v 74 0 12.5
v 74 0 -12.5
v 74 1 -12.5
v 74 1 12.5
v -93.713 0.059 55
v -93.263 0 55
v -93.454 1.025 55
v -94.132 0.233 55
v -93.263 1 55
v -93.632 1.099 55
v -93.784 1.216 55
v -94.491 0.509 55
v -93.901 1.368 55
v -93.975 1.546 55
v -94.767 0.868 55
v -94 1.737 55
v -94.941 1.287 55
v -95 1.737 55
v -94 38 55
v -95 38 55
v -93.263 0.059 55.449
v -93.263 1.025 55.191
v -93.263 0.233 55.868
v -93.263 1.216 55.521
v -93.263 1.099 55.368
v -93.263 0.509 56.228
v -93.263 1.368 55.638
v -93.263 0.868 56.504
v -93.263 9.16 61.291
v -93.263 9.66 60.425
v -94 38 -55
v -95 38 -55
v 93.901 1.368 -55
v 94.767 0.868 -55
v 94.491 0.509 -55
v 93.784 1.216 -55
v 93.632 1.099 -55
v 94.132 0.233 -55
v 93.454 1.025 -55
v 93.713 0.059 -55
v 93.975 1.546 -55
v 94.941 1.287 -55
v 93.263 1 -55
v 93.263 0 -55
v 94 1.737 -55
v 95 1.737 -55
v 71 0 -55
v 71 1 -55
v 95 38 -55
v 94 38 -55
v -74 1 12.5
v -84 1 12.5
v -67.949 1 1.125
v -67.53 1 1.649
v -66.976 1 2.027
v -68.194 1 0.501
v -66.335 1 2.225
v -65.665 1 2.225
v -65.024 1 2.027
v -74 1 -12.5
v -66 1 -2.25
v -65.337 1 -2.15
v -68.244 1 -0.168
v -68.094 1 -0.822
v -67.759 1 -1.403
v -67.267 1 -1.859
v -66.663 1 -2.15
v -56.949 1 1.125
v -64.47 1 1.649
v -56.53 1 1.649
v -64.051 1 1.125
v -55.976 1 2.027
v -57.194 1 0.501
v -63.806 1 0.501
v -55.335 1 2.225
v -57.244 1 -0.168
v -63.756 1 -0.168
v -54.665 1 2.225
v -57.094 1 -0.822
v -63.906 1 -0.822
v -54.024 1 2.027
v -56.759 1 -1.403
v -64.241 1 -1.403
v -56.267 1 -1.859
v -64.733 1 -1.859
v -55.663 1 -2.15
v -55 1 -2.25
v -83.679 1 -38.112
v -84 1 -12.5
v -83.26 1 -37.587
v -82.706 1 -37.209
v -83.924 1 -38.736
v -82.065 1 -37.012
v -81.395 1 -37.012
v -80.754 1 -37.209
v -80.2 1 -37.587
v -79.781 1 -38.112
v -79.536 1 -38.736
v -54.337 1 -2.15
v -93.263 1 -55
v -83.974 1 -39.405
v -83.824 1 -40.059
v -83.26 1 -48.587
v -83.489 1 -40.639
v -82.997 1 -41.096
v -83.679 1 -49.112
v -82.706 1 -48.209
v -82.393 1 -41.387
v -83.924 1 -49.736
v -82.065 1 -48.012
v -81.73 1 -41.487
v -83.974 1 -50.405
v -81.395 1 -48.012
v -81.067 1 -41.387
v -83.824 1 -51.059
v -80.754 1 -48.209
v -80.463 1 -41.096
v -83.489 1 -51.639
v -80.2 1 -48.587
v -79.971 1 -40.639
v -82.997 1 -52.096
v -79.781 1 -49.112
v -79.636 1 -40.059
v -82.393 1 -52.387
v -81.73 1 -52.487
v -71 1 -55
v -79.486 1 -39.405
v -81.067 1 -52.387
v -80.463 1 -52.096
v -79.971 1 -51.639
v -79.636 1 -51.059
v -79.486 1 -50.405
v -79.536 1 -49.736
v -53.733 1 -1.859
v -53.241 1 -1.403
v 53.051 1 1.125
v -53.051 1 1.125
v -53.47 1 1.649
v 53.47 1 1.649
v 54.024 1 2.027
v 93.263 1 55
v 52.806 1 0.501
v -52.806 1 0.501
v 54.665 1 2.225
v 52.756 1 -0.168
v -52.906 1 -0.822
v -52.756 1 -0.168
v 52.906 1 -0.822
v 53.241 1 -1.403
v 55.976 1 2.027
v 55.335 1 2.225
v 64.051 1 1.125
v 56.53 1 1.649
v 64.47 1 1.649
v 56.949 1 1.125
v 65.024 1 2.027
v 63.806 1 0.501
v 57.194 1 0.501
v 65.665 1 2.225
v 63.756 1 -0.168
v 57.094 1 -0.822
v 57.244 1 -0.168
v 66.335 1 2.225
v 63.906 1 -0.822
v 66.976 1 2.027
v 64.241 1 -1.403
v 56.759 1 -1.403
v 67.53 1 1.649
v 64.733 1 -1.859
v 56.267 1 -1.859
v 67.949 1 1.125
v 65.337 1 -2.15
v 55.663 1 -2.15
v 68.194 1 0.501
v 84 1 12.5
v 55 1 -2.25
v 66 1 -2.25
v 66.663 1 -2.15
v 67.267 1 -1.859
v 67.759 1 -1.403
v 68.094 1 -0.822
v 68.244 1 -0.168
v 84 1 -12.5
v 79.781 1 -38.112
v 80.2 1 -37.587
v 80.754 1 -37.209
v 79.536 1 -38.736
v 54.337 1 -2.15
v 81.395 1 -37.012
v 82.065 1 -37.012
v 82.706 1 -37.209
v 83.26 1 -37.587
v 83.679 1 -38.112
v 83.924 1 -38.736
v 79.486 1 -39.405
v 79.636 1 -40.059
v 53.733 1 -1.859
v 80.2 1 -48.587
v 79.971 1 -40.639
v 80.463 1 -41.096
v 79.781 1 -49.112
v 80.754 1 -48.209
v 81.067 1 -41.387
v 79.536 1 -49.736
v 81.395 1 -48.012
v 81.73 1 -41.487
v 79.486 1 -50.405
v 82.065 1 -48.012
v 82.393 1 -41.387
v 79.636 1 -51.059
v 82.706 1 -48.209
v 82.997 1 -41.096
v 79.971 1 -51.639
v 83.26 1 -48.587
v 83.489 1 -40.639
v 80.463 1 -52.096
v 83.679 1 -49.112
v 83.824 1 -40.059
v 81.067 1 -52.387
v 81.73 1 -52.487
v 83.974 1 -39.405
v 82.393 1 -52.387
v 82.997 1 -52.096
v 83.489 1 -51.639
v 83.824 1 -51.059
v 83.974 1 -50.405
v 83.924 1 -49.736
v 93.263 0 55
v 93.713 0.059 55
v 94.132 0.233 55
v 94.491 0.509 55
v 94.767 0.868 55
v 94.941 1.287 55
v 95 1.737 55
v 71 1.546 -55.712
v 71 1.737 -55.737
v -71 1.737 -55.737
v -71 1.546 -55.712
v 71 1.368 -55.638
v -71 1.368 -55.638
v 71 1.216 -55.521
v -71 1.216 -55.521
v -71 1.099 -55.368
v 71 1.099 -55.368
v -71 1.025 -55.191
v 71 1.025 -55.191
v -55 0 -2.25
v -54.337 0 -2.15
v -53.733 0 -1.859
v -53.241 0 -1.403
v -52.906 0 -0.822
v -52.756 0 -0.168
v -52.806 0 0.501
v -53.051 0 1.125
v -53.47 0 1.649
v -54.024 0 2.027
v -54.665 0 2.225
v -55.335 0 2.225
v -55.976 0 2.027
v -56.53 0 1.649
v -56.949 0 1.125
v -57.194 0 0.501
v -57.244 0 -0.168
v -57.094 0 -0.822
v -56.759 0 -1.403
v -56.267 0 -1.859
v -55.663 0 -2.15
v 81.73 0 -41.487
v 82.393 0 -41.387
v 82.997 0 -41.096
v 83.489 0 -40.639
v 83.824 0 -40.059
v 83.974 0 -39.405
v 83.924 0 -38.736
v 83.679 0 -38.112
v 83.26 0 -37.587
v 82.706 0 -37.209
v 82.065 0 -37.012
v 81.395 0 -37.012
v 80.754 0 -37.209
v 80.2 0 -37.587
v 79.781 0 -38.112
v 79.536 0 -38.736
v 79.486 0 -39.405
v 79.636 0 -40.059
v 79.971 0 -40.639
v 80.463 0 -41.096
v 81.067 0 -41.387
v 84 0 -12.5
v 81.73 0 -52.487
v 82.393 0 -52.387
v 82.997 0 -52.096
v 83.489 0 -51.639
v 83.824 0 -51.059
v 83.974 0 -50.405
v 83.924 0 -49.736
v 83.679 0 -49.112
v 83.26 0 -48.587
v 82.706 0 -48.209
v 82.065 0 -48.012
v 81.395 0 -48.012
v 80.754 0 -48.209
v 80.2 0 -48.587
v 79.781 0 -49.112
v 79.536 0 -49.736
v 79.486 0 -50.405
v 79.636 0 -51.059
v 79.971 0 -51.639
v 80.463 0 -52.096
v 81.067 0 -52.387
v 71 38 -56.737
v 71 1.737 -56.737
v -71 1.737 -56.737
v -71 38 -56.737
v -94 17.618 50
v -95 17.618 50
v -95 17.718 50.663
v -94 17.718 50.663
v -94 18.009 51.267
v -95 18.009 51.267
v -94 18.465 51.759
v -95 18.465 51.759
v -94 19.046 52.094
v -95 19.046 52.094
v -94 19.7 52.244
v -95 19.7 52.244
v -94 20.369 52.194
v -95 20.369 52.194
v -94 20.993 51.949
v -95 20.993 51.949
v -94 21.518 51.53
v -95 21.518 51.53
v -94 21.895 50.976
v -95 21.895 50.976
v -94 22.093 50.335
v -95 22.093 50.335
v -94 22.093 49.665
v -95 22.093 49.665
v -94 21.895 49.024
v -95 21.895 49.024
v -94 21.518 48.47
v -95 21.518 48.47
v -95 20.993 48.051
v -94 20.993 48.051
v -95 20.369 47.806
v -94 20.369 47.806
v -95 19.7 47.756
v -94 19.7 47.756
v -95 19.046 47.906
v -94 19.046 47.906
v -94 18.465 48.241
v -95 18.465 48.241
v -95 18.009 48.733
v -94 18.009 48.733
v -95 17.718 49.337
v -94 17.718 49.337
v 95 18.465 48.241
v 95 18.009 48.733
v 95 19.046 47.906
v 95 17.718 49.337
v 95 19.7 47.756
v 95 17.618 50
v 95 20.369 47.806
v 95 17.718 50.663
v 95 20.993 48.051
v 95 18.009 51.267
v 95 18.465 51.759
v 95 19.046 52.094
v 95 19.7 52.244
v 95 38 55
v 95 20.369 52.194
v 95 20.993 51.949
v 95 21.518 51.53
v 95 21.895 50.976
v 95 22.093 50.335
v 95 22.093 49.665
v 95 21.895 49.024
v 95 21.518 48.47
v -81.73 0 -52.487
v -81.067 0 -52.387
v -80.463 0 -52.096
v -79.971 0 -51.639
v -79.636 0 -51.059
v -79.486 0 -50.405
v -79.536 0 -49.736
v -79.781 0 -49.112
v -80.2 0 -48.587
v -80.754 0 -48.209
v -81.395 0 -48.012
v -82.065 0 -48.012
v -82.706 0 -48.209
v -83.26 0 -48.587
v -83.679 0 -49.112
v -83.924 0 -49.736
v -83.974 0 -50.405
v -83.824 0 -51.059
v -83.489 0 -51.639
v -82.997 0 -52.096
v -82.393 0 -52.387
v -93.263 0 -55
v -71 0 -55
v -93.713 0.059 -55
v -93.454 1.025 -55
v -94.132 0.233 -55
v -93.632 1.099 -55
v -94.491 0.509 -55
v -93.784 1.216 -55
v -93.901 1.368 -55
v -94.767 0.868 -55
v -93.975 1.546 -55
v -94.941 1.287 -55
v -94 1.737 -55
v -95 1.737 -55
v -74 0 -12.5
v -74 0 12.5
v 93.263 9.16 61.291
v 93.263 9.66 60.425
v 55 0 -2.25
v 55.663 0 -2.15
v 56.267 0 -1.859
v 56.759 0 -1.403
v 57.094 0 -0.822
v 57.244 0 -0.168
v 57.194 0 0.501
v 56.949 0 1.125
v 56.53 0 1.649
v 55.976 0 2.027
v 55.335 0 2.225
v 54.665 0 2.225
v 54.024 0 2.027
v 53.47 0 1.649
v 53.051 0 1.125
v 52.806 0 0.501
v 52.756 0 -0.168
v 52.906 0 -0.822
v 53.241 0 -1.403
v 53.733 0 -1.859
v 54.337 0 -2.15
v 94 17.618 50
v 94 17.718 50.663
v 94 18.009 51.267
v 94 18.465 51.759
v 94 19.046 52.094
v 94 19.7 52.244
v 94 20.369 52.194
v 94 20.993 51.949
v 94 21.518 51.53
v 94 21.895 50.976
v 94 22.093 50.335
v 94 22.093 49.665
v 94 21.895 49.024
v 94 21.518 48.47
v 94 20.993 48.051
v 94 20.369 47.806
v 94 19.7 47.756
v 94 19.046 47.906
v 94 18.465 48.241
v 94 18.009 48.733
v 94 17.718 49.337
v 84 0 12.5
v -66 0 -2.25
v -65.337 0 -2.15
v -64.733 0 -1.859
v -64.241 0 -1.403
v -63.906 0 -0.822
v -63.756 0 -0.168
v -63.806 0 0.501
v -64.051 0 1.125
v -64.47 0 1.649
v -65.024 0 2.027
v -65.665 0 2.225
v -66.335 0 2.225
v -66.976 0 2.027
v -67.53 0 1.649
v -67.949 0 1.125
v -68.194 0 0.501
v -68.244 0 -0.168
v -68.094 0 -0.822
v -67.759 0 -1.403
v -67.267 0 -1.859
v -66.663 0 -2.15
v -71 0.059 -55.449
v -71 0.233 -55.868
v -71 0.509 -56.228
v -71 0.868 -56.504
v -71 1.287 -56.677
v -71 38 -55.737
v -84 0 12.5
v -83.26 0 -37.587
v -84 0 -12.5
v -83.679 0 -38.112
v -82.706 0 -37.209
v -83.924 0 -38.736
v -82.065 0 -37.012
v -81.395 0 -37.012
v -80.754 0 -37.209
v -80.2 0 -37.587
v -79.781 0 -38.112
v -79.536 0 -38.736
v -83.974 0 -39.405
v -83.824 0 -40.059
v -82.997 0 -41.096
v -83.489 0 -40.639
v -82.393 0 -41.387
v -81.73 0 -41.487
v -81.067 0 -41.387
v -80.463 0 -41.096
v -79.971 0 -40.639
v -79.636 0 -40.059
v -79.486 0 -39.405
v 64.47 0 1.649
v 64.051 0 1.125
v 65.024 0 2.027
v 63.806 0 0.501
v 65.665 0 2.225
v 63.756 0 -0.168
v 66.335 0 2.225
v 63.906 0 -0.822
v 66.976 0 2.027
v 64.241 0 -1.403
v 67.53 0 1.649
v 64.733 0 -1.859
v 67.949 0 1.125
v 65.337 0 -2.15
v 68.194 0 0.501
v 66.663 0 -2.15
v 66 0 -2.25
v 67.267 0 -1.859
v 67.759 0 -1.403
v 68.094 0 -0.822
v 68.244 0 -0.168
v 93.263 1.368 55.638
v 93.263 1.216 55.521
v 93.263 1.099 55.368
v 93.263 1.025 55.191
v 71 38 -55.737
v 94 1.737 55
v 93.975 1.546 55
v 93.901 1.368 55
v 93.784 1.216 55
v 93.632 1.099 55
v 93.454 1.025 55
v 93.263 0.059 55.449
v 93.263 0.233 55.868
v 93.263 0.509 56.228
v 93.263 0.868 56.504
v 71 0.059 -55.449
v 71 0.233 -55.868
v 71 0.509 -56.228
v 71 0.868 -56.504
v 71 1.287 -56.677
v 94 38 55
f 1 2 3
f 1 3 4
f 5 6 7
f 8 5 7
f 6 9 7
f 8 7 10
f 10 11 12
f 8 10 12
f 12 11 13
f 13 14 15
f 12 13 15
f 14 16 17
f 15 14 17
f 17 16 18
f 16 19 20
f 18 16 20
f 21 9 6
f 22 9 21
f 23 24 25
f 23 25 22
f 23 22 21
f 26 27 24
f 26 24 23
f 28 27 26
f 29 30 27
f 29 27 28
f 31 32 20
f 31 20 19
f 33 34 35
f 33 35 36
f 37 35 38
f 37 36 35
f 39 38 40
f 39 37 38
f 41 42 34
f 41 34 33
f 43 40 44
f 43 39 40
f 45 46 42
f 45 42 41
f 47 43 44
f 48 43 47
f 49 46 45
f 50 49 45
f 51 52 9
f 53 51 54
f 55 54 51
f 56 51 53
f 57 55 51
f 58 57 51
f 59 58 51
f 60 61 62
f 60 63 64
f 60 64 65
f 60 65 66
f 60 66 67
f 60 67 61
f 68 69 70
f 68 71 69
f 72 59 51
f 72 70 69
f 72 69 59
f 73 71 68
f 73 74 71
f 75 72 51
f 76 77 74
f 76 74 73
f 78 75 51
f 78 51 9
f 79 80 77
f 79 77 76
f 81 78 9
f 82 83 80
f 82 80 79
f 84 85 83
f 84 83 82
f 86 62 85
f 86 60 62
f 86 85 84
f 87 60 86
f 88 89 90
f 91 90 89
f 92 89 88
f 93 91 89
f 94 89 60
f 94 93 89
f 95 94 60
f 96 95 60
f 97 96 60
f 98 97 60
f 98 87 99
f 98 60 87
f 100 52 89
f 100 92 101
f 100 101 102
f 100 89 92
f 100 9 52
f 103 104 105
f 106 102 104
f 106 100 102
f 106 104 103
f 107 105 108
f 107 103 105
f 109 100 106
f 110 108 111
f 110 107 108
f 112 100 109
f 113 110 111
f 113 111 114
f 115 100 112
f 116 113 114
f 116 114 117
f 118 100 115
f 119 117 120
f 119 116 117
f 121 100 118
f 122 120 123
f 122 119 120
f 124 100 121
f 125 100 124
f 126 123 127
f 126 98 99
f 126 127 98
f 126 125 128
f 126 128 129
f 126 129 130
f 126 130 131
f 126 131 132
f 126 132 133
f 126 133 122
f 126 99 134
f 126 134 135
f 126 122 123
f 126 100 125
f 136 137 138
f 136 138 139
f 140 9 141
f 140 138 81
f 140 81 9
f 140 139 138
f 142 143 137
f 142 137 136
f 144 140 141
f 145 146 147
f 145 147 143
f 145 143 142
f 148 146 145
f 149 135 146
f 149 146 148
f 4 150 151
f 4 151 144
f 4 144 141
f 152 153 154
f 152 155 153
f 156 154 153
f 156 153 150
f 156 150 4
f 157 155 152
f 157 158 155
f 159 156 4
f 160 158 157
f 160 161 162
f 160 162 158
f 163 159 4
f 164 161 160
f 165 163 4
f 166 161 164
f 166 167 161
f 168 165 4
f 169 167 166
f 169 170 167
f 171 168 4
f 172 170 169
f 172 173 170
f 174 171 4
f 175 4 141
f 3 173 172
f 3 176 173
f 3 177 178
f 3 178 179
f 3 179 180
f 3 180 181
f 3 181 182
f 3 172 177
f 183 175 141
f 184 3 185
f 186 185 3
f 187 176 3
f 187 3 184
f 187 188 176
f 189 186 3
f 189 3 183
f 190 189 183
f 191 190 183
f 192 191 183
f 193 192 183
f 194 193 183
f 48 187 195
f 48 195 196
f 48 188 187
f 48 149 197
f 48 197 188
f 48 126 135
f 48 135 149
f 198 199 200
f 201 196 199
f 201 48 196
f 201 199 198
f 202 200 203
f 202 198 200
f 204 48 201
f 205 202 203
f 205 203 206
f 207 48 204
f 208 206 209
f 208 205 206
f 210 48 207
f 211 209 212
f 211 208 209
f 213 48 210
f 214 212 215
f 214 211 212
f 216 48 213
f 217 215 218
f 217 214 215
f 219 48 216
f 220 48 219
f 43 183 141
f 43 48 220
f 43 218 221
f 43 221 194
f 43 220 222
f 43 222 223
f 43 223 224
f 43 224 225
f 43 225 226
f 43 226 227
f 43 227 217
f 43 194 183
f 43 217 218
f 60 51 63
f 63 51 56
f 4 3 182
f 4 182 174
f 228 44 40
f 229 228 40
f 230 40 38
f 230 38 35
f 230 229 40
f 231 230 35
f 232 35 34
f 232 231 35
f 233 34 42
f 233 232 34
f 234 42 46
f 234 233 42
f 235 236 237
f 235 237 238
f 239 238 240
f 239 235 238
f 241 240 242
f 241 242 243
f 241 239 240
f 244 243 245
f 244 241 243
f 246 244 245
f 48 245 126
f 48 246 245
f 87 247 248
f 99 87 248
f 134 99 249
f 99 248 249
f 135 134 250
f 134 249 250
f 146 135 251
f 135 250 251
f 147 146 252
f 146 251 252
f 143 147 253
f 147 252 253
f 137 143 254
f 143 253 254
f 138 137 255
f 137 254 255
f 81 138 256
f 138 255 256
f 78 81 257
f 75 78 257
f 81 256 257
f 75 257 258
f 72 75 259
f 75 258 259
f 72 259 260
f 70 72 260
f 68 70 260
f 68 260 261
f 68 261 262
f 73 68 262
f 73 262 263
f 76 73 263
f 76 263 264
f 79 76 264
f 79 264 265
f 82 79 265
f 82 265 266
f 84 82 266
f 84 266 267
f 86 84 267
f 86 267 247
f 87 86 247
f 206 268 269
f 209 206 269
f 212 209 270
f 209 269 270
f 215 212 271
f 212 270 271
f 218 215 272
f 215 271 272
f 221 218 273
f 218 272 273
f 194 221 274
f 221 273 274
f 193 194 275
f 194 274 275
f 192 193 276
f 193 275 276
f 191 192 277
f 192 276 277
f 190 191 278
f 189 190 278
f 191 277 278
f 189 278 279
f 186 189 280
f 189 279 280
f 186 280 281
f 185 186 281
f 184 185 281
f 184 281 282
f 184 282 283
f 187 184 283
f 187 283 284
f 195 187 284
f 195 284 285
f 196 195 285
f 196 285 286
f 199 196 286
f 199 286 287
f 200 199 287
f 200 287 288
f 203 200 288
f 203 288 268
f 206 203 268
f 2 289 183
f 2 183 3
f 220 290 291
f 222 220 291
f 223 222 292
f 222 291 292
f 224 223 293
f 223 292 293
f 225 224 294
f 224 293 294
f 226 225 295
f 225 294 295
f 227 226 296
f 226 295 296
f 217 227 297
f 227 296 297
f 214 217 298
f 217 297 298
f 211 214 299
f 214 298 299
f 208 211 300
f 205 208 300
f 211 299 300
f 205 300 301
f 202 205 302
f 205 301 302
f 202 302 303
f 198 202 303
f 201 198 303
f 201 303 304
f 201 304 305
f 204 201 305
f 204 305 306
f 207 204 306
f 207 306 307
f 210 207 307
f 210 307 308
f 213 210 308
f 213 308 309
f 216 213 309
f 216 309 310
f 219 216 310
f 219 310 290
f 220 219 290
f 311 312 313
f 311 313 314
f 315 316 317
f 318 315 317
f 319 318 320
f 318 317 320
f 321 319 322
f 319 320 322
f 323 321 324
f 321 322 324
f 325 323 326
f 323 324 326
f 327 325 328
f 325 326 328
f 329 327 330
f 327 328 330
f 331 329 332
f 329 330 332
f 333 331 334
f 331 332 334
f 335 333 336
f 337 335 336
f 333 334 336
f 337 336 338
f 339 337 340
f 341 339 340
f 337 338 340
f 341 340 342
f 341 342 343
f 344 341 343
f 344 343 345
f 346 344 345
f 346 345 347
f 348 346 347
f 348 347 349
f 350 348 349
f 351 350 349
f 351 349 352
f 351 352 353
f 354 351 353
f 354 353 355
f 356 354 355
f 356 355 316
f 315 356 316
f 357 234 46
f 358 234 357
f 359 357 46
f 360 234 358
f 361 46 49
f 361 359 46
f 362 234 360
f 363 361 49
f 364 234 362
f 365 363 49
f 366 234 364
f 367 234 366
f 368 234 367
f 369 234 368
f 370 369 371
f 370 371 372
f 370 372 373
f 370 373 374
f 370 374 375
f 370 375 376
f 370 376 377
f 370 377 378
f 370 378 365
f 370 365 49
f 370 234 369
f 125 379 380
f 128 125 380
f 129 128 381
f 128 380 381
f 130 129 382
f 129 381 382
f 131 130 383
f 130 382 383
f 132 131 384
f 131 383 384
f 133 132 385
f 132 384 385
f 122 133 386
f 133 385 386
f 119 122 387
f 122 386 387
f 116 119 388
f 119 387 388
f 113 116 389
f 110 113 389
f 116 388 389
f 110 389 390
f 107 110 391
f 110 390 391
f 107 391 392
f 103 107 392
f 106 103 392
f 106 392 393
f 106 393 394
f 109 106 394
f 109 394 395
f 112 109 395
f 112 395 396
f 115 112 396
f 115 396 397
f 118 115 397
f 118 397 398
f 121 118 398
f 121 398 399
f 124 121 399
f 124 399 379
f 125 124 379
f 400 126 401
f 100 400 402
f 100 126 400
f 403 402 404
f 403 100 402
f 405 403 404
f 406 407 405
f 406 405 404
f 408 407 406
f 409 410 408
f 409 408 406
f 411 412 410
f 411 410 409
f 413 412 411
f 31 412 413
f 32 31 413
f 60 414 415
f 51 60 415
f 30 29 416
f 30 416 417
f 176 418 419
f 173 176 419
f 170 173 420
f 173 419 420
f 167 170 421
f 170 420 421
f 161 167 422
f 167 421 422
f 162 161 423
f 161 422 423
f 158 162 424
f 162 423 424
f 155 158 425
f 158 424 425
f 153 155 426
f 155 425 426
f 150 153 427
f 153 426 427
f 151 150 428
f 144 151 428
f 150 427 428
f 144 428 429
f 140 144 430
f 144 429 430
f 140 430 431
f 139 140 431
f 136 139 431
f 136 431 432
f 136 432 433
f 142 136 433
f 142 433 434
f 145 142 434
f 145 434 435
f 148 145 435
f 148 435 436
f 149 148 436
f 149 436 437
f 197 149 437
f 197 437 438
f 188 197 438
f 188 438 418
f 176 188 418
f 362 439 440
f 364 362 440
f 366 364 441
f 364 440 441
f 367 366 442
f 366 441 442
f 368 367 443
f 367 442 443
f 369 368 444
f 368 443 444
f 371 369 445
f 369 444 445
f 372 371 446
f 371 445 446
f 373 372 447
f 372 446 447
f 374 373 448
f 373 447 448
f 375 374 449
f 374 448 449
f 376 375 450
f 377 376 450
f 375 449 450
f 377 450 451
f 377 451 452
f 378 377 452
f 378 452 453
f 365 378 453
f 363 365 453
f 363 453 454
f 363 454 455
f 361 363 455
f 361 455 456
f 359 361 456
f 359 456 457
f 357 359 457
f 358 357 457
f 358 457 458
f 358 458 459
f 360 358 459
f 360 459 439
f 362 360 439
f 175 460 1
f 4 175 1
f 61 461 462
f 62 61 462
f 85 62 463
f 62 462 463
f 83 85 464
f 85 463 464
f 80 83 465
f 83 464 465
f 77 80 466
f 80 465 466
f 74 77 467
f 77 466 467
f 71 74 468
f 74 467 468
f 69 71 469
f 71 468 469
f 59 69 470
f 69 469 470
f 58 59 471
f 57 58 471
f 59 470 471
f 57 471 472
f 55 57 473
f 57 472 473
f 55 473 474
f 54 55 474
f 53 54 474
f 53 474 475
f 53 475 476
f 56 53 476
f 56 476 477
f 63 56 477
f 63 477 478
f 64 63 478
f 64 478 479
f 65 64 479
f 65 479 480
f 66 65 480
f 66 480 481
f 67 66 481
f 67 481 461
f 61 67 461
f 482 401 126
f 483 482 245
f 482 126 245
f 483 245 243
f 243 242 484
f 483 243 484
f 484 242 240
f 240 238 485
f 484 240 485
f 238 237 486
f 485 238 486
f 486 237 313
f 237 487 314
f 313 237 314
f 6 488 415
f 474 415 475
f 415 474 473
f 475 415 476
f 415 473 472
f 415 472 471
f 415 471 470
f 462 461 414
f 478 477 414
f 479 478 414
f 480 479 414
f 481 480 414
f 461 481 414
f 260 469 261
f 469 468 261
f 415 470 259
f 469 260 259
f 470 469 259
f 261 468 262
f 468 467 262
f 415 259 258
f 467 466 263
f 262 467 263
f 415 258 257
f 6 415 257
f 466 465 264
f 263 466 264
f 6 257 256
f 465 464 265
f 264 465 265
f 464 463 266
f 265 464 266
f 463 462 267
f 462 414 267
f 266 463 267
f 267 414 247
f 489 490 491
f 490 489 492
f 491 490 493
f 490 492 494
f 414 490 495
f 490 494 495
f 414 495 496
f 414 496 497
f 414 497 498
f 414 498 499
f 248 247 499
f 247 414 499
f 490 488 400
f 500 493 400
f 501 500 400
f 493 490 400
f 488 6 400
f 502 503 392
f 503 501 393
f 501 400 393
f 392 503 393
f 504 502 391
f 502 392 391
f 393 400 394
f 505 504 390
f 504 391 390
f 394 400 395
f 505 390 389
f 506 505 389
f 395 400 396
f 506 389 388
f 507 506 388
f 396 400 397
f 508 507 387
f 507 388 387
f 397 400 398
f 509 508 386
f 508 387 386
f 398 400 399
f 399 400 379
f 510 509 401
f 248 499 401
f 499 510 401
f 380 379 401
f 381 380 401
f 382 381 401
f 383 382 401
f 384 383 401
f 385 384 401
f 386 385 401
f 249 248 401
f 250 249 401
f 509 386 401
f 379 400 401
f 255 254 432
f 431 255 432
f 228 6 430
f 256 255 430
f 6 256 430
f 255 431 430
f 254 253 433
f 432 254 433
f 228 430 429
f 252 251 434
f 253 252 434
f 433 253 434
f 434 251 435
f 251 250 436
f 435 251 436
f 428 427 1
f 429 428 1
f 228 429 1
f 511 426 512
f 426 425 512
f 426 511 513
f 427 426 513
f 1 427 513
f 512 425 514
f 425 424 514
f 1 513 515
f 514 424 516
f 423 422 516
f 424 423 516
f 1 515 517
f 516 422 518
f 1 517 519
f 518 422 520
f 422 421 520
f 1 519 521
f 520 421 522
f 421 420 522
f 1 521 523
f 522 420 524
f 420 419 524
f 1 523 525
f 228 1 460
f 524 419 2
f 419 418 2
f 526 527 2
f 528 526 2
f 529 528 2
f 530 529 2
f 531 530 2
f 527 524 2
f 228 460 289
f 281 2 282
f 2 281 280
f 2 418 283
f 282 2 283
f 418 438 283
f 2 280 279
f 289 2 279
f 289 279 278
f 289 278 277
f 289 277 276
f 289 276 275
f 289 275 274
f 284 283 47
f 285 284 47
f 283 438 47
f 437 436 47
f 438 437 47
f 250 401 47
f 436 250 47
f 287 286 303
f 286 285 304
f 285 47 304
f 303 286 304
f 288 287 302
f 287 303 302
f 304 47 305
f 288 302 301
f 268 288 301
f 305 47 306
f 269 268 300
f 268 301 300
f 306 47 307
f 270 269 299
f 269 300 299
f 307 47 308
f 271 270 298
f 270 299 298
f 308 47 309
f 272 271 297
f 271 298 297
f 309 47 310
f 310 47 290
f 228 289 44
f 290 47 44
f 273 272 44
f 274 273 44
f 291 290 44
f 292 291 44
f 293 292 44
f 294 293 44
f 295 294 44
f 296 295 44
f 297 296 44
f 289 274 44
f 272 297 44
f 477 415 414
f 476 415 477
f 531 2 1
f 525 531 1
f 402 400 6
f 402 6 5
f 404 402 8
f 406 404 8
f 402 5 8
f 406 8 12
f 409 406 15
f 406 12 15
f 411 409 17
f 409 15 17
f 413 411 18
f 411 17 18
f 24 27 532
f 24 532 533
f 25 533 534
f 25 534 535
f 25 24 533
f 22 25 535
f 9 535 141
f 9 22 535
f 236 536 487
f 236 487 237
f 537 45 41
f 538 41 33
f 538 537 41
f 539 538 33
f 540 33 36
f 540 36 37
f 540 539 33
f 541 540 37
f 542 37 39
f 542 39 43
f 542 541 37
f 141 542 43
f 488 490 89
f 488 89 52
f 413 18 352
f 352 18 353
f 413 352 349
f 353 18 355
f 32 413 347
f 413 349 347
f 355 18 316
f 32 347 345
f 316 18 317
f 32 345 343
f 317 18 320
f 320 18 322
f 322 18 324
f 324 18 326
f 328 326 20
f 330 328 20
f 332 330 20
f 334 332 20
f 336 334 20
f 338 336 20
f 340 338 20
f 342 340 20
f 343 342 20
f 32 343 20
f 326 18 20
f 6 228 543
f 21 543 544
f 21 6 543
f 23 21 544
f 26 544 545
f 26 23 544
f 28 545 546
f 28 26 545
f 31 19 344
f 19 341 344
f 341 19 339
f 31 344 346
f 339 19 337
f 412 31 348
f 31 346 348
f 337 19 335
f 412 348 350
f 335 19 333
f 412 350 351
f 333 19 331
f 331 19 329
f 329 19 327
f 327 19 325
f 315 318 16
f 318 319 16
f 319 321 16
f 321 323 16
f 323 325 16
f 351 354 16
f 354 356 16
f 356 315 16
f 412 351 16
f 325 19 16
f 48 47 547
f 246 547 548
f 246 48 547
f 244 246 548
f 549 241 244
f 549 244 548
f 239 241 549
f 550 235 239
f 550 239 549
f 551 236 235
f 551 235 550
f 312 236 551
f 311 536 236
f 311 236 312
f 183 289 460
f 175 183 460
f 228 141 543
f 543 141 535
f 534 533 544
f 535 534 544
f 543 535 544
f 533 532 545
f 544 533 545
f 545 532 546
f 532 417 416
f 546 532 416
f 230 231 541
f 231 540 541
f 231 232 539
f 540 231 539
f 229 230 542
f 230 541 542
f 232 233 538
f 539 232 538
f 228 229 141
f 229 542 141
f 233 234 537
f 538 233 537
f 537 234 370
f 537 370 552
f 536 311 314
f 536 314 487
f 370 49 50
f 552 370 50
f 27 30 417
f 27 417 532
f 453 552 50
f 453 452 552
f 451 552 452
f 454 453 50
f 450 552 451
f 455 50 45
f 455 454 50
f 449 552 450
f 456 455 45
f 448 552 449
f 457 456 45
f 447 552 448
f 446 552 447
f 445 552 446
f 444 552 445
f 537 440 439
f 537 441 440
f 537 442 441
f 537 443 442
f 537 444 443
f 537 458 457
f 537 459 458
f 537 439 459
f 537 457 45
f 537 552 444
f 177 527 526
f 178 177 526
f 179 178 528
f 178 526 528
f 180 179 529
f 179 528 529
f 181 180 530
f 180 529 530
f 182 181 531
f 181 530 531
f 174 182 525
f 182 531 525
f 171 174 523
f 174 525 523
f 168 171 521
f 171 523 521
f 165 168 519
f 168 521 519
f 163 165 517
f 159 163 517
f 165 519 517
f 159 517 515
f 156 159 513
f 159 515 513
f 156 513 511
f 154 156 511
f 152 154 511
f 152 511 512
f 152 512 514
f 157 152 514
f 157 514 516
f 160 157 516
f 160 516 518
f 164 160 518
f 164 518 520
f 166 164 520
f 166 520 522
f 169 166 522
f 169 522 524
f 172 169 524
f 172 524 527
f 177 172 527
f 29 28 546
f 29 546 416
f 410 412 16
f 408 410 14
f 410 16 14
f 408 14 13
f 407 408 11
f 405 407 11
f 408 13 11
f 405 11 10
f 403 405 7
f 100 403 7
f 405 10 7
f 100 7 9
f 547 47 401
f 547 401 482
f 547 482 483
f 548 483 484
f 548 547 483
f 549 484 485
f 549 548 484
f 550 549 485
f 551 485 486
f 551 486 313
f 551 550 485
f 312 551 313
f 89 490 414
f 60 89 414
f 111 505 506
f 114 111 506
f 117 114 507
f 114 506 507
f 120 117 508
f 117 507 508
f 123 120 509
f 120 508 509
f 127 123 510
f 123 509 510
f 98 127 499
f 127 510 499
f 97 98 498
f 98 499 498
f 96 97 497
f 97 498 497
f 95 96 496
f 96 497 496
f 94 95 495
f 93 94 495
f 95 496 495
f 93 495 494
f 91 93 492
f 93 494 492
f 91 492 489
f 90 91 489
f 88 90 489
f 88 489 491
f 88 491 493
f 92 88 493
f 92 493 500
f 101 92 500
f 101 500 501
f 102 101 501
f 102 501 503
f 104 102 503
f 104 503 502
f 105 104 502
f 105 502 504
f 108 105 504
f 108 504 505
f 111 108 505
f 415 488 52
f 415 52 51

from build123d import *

# Parameters (mm, degrees)
SKETCH2_W                    = 190
SKETCH2_H                    = 110
BASE_FLANGE1_DEPTH           = 1
EDGE_FLANGE1_STRIP_W         = 5.4732
EDGE_FLANGE1_STRIP_H         = 1
EDGE_FLANGE1_STRIP_CUT_DEPTH = 110
EDGE_FLANGE1_DEPTH           = 110
SKETCH16_R                   = 2.25
CUT_EXTRUDE1_DEPTH           = 117.163677628
SKETCH17_W                   = 10
SKETCH17_H                   = 25
CUT_EXTRUDE2_DEPTH           = 117.163677628
EDGE_FLANGE2_DEPTH           = 142
EDGE_FLANGE3_DEPTH           = 186.5268
SKETCH29_R                   = 2.25
CUT_EXTRUDE3_DEPTH           = 204.225548722
SKETCH30_R                   = 2.25
CUT_EXTRUDE4_DEPTH           = 120.271218881


# Sheet-metal steps are written as plain solids
with BuildPart() as part:
    # Sketch2 → Base-Flange1 (new body)
    with BuildSketch(Plane(origin=(0, 0, 0), x_dir=(1, 0, 0), z_dir=(0, 1, 0))):
        Rectangle(SKETCH2_W, SKETCH2_H)
    extrude(amount=BASE_FLANGE1_DEPTH)

    # Edge-Flange1 strip (across the edge) → Edge-Flange1 strip cut (cut)
    with BuildSketch(Plane(origin=(95, 1, 55), x_dir=(-1, 0, 0), z_dir=(0, 0, -1))):
        with Locations((-1, -0.5)):
            Rectangle(EDGE_FLANGE1_STRIP_W, EDGE_FLANGE1_STRIP_H)
    edge_flange1_strip_cut = extrude(amount=EDGE_FLANGE1_STRIP_CUT_DEPTH, mode=Mode.SUBTRACT)

    # Edge-Flange1 section (across the edge) → Edge-Flange1 (add)
    with BuildSketch(Plane(origin=(95, 1, 55), x_dir=(-1, 0, 0), z_dir=(0, 0, -1))):
        with BuildLine():
            Line((0, 0.7366), (0, 37))
            Line((0, 37), (1, 37))
            Line((1, 37), (1, 0.7366))
            ThreePointArc((1, 0.7366), (1.215745145, 0.215745145), (1.7366, 0))
            Line((1.7366, 0), (1.7366, -1))
            ThreePointArc((1.7366, -1), (0.508638364, -0.491361636), (0, 0.7366))
        make_face()
    edge_flange1 = extrude(amount=EDGE_FLANGE1_DEPTH)

    # Mirror1: Edge-Flange1 strip cut, Edge-Flange1 across plane
    add(edge_flange1_strip_cut.mirror(Plane(origin=(0, 0, 0), x_dir=(0, 0, 1), z_dir=(1, 0, 0))), mode=Mode.SUBTRACT)
    add(edge_flange1.mirror(Plane(origin=(0, 0, 0), x_dir=(0, 0, 1), z_dir=(1, 0, 0))))

    # Sketch16 → Cut-Extrude1 (cut, through all)
    with BuildSketch(Plane.XZ):
        with Locations(Location((-55, 0, 0), (0, 0, 270))):
            Circle(SKETCH16_R)
        with Locations(Location((55, 0, 0), (0, 0, 270))):
            Circle(SKETCH16_R)
        with Locations(Location((66, 0, 0), (0, 0, 270))):
            Circle(SKETCH16_R)
        with Locations(Location((-66, 0, 0), (0, 0, 270))):
            Circle(SKETCH16_R)
    extrude(amount=-CUT_EXTRUDE1_DEPTH, mode=Mode.SUBTRACT)

    # Sketch17 → Cut-Extrude2 (cut, through all)
    with BuildSketch(Plane.XZ):
        with Locations((-79, 0)):
            Rectangle(SKETCH17_W, SKETCH17_H)
    cut_extrude2 = extrude(amount=-CUT_EXTRUDE2_DEPTH, mode=Mode.SUBTRACT)

    # Mirror2: Cut-Extrude2 across plane
    add(cut_extrude2.mirror(Plane(origin=(0, 0, 0), x_dir=(0, 0, 1), z_dir=(1, 0, 0))), mode=Mode.SUBTRACT)

    # Edge-Flange2 section (across the edge) → Edge-Flange2 (add)
    with BuildSketch(Plane(origin=(71, 1, -55.7366), x_dir=(0, 0, 1), z_dir=(-1, 0, 0))):
        with BuildLine():
            Line((-1, 0.7366), (-1, 37))
            Line((-1, 37), (0, 37))
            Line((0, 37), (0, 0.7366))
            ThreePointArc((0, 0.7366), (0.215745145, 0.215745145), (0.7366, 0))
            Line((0.7366, 0), (0.7366, -1))
            ThreePointArc((0.7366, -1), (-0.491361636, -0.491361636), (-1, 0.7366))
        make_face()
    extrude(amount=EDGE_FLANGE2_DEPTH)

    # Edge-Flange3 section (across the edge) → Edge-Flange3 (add)
    with BuildSketch(Plane(origin=(-93.2634, 1, 55.425276208), x_dir=(0, 0.5000000000000041, -0.8660254037844364), z_dir=(1, 0, 0))):
        with BuildLine():
            Line((-1, 0.425276208), (-1, 10))
            Line((-1, 10), (0, 10))
            Line((0, 10), (0, 0.425276208))
            ThreePointArc((0, 0.425276208), (0.098685688, 0.056976208), (0.3683, -0.212638104))
            Line((0.3683, -0.212638104), (-0.1317, -1.078663508))
            ThreePointArc((-0.1317, -1.078663508), (-0.767339716, -0.443023792), (-1, 0.425276208))
        make_face()
    extrude(amount=EDGE_FLANGE3_DEPTH)

    # Sketch29 → Cut-Extrude3 (cut, through all)
    with BuildSketch(Plane.ZY.offset(95)):
        with Locations(Location((50, 19.8683, 0), (0, 0, 270))):
            Circle(SKETCH29_R)
    extrude(amount=-CUT_EXTRUDE3_DEPTH, mode=Mode.SUBTRACT)

    # Sketch30 → Cut-Extrude4 (cut, through all)
    with BuildSketch(Plane.XZ):
        with Locations(Location((81.73, -39.2366, 0), (0, 0, 270))):
            Circle(SKETCH30_R)
        with Locations(Location((81.73, -50.2366, 0), (0, 0, 270))):
            Circle(SKETCH30_R)
        with Locations(Location((-81.73, -39.2366, 0), (0, 0, 270))):
            Circle(SKETCH30_R)
        with Locations(Location((-81.73, -50.2366, 0), (0, 0, 270))):
            Circle(SKETCH30_R)
    extrude(amount=-CUT_EXTRUDE4_DEPTH, mode=Mode.SUBTRACT)


solid = part.part
